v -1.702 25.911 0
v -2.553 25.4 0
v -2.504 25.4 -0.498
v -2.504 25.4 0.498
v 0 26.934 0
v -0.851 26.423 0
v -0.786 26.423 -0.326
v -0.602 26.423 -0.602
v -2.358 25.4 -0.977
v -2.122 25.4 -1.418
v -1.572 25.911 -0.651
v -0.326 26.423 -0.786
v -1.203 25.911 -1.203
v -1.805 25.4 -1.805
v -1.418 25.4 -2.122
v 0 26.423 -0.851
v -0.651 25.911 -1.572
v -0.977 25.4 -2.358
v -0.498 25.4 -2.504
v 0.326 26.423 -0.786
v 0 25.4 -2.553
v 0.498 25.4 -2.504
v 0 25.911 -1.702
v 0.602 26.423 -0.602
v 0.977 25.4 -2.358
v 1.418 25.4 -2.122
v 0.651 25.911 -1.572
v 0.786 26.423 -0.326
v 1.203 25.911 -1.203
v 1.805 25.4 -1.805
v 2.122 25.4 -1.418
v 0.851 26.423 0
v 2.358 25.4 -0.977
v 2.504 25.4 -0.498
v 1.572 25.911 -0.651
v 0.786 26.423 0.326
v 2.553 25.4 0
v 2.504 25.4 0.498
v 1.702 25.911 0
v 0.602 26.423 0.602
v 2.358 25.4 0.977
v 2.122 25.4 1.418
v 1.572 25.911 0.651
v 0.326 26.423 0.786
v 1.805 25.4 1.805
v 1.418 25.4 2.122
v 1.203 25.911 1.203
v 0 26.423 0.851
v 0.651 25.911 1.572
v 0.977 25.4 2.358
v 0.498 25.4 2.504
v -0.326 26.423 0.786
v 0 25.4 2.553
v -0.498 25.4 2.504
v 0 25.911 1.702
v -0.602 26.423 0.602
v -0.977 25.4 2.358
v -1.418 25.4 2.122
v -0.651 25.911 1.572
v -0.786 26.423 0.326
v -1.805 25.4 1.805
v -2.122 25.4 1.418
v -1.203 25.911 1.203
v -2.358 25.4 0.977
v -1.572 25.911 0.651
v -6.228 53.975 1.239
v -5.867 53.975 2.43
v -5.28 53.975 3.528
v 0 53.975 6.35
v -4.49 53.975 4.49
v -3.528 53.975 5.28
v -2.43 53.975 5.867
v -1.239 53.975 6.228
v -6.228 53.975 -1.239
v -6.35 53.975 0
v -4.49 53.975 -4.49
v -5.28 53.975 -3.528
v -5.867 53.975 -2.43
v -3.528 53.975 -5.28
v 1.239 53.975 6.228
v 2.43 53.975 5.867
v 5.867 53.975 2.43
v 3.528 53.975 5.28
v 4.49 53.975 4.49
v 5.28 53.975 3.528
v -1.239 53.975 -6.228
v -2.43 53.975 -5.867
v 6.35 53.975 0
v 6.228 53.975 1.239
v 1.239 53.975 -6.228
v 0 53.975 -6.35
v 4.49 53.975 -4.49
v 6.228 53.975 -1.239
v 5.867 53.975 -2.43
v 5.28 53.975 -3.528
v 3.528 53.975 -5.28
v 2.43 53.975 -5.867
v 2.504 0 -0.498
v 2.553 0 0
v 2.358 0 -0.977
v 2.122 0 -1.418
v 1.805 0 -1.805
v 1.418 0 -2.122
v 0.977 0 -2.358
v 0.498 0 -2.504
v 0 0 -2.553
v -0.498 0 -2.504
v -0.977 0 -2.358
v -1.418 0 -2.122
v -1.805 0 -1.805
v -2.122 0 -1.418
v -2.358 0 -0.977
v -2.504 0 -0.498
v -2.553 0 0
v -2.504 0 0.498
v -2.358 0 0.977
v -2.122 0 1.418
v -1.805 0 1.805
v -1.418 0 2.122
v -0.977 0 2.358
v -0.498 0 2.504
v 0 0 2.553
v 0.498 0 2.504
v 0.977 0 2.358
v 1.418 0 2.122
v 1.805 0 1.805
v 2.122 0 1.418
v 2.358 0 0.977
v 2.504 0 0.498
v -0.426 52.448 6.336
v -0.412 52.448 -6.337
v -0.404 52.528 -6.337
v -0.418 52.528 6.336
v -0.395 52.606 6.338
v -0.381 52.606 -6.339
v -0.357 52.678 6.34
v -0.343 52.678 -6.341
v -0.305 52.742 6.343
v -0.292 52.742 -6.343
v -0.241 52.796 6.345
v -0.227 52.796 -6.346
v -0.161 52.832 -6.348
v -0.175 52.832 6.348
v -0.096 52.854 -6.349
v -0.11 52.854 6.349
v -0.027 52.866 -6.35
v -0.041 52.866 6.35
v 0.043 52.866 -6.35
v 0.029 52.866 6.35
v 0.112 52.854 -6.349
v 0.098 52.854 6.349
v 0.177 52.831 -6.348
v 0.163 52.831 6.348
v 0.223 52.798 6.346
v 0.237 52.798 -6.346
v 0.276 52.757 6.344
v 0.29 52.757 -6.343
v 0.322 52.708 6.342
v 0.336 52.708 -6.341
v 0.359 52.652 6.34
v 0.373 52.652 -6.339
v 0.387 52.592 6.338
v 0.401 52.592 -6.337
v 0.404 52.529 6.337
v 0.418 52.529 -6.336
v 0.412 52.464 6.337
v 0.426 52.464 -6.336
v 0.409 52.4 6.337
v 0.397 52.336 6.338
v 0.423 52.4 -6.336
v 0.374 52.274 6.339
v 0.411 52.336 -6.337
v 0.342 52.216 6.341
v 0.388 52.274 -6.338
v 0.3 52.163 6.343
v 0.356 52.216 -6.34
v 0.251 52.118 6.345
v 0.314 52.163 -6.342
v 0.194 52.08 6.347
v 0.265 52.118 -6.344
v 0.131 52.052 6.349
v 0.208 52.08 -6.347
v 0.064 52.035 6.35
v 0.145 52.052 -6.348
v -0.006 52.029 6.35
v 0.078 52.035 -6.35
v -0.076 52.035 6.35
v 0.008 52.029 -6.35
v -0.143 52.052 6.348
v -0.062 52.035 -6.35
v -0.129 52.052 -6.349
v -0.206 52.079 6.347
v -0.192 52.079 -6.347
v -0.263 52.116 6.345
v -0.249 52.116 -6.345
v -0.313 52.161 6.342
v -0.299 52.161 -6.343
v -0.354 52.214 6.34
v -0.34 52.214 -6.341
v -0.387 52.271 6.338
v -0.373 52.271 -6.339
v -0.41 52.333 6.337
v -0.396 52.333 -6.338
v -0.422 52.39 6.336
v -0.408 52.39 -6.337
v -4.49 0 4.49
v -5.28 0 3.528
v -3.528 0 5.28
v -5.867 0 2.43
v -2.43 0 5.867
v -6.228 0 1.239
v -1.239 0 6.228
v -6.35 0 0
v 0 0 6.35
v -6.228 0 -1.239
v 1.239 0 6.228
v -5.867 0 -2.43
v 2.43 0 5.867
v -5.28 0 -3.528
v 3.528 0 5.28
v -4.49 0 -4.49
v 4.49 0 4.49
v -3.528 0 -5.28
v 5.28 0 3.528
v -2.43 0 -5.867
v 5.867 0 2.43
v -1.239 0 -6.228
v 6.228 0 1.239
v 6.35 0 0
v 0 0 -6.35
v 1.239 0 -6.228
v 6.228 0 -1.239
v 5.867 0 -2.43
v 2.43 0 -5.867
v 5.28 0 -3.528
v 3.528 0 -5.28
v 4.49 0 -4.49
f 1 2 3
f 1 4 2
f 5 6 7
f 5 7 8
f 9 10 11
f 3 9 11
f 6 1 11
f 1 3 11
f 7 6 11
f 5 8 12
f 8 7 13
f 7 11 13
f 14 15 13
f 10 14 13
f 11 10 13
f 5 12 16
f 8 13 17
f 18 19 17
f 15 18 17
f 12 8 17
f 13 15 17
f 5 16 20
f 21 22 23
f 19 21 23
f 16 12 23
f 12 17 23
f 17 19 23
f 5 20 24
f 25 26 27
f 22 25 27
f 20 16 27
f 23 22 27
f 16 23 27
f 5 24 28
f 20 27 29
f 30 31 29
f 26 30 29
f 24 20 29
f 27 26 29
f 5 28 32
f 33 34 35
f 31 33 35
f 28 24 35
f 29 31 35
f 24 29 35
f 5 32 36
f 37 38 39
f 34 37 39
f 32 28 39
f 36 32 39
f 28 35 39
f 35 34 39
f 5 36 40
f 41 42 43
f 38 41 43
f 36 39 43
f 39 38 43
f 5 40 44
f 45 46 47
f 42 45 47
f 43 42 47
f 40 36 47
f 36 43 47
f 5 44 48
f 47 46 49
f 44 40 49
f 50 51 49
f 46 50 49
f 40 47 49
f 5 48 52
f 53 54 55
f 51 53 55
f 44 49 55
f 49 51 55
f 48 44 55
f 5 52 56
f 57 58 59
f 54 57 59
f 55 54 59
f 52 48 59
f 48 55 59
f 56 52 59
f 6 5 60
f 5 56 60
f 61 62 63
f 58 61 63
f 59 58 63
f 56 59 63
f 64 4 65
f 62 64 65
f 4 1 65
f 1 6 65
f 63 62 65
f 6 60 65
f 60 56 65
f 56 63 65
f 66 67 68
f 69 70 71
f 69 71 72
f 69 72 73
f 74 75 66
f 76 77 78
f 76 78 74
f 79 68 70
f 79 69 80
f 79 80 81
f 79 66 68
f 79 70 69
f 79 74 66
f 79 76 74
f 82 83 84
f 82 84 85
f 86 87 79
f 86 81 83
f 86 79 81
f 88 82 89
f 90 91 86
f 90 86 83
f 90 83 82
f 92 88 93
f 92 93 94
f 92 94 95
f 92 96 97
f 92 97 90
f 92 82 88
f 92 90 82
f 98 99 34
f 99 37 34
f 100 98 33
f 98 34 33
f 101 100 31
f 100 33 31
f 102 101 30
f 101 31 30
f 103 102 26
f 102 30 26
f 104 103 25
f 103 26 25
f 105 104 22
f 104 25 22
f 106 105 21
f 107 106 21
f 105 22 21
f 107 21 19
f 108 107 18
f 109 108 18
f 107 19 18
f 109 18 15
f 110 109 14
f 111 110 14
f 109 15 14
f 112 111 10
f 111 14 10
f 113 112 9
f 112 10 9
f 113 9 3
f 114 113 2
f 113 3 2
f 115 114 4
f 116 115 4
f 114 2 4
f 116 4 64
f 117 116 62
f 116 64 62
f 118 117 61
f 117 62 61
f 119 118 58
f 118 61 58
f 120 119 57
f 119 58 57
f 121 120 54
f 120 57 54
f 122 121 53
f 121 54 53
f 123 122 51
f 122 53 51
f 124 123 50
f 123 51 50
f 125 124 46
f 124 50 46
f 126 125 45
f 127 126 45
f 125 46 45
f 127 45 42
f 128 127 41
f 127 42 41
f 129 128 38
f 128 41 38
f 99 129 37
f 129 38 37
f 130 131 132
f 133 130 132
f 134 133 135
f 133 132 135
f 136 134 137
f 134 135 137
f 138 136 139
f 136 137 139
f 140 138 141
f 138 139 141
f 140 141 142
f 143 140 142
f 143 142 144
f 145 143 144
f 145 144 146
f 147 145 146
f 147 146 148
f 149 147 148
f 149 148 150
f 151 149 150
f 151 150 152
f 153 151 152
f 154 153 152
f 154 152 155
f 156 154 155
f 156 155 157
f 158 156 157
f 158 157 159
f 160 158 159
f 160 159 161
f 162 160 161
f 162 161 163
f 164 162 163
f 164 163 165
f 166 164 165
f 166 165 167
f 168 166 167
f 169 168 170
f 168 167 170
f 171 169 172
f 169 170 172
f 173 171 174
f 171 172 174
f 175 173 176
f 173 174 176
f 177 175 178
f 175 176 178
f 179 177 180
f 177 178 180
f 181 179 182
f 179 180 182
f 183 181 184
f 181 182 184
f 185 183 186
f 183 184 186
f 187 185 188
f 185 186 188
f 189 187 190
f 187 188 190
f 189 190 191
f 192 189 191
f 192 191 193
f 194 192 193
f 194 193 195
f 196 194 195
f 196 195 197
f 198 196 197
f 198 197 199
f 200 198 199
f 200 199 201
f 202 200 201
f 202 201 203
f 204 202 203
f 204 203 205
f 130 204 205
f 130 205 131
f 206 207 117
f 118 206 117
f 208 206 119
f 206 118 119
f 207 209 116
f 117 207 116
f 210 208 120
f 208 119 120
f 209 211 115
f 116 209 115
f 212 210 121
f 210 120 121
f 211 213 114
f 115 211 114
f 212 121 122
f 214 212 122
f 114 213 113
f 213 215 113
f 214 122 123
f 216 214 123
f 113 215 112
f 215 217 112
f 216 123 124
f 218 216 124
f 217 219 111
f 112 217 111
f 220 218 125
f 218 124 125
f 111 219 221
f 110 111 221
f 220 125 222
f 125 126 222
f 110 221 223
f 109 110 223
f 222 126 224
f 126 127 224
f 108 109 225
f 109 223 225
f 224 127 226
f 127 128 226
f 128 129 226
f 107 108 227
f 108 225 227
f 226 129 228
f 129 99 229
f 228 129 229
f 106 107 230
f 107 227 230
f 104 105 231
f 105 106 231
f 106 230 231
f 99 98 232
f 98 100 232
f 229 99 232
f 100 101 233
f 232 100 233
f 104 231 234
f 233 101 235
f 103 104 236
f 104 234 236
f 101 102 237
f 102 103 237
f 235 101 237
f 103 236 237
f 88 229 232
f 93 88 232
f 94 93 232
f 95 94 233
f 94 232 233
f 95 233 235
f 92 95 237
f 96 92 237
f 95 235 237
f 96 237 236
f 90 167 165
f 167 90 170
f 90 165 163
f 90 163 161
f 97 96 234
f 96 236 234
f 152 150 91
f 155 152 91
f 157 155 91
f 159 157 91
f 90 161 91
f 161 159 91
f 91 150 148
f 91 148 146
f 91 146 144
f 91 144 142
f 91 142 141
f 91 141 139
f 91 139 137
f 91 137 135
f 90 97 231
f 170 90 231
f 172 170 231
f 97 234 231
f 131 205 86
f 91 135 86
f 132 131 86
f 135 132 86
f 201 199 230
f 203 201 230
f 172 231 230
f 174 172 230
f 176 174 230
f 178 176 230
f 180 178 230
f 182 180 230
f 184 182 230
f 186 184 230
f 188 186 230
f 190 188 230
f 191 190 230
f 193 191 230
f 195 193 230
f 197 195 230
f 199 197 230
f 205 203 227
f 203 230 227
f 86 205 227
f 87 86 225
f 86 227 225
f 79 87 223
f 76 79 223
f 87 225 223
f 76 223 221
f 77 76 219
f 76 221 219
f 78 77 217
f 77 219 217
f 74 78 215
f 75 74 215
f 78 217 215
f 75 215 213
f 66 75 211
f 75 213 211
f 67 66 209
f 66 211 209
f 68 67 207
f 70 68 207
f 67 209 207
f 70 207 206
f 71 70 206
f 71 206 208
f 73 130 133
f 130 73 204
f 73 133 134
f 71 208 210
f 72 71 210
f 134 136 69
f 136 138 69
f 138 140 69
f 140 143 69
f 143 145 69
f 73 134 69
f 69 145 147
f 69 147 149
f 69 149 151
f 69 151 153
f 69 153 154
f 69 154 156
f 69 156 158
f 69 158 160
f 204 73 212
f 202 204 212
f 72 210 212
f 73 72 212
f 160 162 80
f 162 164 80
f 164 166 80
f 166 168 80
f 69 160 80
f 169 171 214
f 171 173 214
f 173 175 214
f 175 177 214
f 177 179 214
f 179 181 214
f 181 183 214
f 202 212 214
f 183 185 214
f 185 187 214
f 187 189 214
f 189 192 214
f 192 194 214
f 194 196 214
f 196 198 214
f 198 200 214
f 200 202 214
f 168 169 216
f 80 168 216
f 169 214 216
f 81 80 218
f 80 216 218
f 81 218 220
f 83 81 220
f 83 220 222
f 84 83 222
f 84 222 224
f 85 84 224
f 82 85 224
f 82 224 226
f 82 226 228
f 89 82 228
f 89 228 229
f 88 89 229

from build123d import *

# Parameters (mm, degrees)
SKETCH1_R                   = 6.35
BOSS_EXTRUDE1_DEPTH         = 53.975
F_1_4_20_TAPPED_HOLE1_D     = 5.1054
F_1_4_20_TAPPED_HOLE1_DEPTH = 25.4
F_1_4_20_TAPPED_HOLE1_TIP   = 1.533816902
F_66_0_033_DIAMETER_HOLE1_D = 0.8382


with BuildPart() as part:
    # Sketch1 → Boss-Extrude1 (new body)
    with BuildSketch(Plane(origin=(0, 0, 0), x_dir=(1, 0, 0), z_dir=(0, 1, 0))):
        Circle(SKETCH1_R)
    extrude(amount=BOSS_EXTRUDE1_DEPTH)

    # 1/4-20 Tapped Hole1
    with Locations(Plane(origin=(0, 0, 0), x_dir=(-1, 0, 0), z_dir=(0, -1, 0))):
        with Locations((0, 0)):
            Hole(F_1_4_20_TAPPED_HOLE1_D / 2, depth=F_1_4_20_TAPPED_HOLE1_DEPTH)
            with Locations((0, 0, -(F_1_4_20_TAPPED_HOLE1_DEPTH + F_1_4_20_TAPPED_HOLE1_TIP / 2))):  # 118° drill point
                Cone(0, F_1_4_20_TAPPED_HOLE1_D / 2, F_1_4_20_TAPPED_HOLE1_TIP, mode=Mode.SUBTRACT)

    # #66 (0.033) Diameter Hole1 (through all)
    with Locations(Plane(origin=(-0.006974239, 52.448108519, 6.34999617), x_dir=(0.999999397, 0, 0.001098305), z_dir=(-0.001098305, 0, 0.999999397))):
        with Locations((0, 0)):
            Hole(F_66_0_033_DIAMETER_HOLE1_D / 2)


solid = part.part
